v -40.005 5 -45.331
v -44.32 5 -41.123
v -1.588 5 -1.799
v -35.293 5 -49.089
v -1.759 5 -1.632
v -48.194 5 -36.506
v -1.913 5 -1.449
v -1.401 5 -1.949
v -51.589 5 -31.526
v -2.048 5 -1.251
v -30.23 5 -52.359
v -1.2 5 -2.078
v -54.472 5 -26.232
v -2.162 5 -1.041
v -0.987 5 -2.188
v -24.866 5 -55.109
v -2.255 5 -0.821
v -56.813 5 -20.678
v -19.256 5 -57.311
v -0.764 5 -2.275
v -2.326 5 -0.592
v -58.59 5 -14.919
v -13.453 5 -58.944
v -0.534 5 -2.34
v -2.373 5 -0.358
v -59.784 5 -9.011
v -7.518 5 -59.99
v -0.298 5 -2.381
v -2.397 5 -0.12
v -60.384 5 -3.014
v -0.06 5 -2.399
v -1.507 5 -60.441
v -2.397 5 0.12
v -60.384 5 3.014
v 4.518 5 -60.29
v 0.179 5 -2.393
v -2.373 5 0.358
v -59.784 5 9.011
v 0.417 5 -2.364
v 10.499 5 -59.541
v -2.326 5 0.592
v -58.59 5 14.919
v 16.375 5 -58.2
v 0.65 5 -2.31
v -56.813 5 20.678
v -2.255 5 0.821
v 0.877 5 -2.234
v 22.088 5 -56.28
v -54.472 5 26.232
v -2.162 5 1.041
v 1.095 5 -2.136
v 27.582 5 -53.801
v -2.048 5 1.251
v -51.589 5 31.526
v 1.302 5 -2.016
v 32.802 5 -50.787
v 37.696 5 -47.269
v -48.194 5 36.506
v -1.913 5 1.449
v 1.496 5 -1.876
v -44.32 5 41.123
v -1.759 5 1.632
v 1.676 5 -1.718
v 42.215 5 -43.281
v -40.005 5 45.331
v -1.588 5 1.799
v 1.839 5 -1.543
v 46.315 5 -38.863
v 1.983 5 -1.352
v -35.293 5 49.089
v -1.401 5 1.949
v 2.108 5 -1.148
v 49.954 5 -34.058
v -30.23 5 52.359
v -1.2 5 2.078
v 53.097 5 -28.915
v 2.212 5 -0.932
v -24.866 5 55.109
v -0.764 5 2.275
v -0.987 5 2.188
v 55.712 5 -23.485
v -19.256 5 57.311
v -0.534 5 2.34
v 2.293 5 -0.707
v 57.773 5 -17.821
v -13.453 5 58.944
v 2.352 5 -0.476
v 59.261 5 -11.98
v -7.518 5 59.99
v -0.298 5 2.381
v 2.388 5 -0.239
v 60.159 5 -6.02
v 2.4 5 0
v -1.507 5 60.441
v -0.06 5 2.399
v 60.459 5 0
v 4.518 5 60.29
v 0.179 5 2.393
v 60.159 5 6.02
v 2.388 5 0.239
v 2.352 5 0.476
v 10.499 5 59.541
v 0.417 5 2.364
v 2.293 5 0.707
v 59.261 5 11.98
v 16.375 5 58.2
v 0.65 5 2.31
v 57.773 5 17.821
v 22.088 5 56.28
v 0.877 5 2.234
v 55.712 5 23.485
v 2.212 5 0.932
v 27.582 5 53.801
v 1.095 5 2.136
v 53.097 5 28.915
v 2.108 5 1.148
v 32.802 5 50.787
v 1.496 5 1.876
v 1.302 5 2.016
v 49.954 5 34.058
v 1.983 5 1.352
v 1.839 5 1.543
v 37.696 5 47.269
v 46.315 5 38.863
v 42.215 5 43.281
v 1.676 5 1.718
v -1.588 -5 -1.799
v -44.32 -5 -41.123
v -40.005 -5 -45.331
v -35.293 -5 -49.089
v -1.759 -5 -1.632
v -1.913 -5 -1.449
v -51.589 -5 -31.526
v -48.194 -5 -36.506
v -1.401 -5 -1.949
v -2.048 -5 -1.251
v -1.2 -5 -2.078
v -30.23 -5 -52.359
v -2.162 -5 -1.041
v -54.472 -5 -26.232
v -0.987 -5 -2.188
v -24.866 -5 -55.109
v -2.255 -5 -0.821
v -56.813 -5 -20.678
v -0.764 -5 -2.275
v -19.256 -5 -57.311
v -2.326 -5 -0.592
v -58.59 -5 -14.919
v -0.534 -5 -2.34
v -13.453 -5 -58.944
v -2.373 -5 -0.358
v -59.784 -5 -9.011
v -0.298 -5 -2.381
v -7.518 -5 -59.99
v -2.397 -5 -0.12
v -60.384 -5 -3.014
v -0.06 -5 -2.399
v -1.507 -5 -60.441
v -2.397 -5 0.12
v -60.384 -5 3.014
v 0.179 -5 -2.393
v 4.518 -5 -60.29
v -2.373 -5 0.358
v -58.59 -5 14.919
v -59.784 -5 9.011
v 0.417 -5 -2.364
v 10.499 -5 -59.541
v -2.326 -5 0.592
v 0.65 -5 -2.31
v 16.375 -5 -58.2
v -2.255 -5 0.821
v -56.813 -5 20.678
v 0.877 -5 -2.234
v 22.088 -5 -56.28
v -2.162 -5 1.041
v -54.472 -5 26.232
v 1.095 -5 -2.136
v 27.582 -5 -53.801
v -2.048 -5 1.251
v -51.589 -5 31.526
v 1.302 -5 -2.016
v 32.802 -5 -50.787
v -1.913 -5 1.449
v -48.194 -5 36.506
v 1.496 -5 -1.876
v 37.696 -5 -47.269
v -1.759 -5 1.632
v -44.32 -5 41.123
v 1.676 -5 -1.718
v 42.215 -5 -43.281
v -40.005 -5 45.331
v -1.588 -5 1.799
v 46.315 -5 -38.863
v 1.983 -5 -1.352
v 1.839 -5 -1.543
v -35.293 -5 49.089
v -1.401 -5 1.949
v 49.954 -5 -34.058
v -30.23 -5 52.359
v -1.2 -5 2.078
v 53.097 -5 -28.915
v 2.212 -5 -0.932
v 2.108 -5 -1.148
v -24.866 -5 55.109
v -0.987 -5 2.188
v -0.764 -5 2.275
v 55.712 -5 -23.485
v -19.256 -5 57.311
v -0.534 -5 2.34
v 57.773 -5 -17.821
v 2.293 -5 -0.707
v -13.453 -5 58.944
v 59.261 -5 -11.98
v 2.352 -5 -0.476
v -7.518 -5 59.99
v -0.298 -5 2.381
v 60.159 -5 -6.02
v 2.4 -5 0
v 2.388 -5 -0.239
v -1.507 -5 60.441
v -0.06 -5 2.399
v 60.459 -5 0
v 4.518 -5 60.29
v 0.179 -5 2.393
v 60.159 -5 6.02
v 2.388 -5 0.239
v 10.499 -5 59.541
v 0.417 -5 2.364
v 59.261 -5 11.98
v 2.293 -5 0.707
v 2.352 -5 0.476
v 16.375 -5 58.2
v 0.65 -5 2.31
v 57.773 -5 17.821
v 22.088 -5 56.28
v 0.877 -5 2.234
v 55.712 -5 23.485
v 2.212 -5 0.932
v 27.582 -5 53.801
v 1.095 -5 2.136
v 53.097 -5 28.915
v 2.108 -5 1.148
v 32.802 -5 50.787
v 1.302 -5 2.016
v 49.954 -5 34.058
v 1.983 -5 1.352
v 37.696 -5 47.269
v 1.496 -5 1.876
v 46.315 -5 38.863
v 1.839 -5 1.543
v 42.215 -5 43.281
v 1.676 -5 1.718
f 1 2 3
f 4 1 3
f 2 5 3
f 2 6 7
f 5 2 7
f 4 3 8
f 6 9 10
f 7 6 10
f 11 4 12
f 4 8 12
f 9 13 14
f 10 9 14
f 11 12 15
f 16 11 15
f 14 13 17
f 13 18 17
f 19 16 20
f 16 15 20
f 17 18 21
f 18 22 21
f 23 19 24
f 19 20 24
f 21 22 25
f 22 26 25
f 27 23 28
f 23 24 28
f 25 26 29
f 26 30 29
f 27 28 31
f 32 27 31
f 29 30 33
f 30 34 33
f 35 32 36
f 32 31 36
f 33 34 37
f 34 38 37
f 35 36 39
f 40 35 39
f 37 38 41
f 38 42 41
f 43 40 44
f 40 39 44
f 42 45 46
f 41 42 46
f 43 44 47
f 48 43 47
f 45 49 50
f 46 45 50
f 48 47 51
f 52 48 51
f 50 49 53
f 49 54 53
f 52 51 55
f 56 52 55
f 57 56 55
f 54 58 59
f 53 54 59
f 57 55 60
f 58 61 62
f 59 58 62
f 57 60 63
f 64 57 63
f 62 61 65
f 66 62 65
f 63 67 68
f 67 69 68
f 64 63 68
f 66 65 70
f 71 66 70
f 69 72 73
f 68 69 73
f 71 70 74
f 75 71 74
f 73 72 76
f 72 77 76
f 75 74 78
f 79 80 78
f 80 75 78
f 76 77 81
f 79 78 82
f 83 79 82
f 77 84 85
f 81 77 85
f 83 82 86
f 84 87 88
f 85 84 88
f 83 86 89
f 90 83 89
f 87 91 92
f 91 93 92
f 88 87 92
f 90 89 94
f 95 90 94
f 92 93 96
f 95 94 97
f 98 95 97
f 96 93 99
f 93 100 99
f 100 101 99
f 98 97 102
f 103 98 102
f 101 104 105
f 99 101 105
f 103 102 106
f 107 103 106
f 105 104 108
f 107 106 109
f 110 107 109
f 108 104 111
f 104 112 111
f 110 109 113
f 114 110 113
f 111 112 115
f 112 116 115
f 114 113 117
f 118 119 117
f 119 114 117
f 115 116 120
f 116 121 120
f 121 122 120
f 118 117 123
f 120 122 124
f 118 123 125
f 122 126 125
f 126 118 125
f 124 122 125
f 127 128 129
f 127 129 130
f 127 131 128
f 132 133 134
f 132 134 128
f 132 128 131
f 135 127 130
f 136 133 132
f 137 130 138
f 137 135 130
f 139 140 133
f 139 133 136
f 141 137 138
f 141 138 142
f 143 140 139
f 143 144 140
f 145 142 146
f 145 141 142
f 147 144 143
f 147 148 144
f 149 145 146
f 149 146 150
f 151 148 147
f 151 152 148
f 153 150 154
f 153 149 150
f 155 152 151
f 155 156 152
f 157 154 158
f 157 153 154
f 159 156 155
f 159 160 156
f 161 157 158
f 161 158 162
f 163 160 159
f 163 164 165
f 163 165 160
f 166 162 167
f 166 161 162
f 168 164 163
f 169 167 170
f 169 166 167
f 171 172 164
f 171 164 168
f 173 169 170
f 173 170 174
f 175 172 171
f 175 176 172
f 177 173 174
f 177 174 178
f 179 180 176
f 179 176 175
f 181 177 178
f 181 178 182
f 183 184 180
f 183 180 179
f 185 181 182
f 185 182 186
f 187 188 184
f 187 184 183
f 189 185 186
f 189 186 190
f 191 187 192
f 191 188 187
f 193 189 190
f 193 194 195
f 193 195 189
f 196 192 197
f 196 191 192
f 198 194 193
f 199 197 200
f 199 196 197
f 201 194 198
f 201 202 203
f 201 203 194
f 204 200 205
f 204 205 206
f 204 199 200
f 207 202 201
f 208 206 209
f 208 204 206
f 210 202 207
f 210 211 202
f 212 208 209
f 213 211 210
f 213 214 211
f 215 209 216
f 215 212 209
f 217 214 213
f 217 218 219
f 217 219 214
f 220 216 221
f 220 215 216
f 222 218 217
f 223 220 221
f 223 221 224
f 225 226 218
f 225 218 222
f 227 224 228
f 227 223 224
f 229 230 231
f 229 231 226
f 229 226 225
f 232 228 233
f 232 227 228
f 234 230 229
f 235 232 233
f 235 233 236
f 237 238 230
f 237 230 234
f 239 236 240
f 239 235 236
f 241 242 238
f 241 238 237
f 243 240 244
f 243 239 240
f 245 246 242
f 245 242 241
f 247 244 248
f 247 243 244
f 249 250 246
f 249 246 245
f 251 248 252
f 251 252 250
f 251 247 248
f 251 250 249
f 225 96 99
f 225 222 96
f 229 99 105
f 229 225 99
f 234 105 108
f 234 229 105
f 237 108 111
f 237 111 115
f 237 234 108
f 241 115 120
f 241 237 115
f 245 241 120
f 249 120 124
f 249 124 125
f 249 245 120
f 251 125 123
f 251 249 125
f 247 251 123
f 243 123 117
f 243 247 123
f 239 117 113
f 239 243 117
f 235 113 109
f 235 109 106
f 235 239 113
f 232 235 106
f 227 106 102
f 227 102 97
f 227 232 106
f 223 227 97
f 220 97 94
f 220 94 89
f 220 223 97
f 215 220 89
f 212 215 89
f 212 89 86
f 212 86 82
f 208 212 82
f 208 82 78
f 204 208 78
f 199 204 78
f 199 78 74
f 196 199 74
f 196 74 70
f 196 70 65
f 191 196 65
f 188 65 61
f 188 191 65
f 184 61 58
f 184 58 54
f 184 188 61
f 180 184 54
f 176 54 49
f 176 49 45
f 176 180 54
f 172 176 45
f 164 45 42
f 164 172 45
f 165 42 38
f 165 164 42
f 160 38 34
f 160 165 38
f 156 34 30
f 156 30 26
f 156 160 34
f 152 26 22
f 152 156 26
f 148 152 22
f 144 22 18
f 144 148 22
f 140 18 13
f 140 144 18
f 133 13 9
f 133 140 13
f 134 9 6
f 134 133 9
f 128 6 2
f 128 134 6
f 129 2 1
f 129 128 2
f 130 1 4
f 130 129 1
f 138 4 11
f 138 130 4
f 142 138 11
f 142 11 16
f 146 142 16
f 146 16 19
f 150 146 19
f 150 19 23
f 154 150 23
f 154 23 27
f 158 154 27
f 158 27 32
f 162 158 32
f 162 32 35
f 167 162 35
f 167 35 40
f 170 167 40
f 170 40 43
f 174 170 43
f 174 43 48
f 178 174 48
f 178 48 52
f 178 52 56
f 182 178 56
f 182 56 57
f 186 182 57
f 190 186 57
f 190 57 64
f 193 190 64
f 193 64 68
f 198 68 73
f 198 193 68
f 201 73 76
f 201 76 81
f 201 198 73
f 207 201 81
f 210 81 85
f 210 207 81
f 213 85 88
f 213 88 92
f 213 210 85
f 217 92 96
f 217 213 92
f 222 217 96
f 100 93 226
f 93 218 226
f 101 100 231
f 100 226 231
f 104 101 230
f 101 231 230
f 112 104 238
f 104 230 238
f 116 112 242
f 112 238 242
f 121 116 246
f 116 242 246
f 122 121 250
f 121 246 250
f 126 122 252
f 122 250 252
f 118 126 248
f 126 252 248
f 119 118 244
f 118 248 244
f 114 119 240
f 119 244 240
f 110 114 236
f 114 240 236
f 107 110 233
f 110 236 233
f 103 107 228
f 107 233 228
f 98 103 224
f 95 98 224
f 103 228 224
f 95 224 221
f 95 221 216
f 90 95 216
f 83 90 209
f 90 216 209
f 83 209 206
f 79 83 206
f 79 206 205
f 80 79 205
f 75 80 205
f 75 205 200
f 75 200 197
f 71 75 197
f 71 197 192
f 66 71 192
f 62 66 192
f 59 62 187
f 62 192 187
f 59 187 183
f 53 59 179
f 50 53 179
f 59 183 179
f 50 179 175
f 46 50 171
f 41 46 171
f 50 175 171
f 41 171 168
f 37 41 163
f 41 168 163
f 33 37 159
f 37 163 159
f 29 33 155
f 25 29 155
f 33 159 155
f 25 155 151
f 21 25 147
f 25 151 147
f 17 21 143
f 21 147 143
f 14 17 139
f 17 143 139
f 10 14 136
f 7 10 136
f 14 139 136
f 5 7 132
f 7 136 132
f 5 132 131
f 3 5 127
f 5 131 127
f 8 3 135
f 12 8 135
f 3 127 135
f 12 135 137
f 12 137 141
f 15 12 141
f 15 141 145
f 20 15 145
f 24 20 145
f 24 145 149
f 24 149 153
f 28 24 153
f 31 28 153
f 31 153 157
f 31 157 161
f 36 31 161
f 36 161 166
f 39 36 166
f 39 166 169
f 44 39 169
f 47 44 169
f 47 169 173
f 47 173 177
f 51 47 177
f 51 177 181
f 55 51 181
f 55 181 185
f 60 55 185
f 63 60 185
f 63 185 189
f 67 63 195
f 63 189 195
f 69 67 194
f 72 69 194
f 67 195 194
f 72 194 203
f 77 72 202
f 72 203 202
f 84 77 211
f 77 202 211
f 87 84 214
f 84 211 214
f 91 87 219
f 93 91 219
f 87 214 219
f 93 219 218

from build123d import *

# Parameters (mm, degrees)
F0_R     = 60.459431
F2_DEPTH = 5
F1_R     = 2.4
F3_DEPTH = 5
F4_DEPTH = 25
F5_DEPTH = 25


with BuildPart() as f2:
    # F0 (on Front) → F2 (new body, symmetric)
    with BuildSketch(Plane.XZ):
        Circle(F0_R)
    extrude(amount=F2_DEPTH, both=True)

    # F1 (on face) → F3 (join, through all)
    with BuildSketch(Plane.XZ):
        Circle(F1_R)
    extrude(amount=F3_DEPTH)

    # F1 (on face) → F4 (cut)
    with BuildSketch(Plane.XZ):
        Circle(F1_R)
    extrude(amount=-F4_DEPTH, mode=Mode.SUBTRACT)

    # F1 (on face) → F5 (cut)
    with BuildSketch(Plane.XZ):
        Circle(F1_R)
    extrude(amount=F5_DEPTH, mode=Mode.SUBTRACT)


solid = f2.part
